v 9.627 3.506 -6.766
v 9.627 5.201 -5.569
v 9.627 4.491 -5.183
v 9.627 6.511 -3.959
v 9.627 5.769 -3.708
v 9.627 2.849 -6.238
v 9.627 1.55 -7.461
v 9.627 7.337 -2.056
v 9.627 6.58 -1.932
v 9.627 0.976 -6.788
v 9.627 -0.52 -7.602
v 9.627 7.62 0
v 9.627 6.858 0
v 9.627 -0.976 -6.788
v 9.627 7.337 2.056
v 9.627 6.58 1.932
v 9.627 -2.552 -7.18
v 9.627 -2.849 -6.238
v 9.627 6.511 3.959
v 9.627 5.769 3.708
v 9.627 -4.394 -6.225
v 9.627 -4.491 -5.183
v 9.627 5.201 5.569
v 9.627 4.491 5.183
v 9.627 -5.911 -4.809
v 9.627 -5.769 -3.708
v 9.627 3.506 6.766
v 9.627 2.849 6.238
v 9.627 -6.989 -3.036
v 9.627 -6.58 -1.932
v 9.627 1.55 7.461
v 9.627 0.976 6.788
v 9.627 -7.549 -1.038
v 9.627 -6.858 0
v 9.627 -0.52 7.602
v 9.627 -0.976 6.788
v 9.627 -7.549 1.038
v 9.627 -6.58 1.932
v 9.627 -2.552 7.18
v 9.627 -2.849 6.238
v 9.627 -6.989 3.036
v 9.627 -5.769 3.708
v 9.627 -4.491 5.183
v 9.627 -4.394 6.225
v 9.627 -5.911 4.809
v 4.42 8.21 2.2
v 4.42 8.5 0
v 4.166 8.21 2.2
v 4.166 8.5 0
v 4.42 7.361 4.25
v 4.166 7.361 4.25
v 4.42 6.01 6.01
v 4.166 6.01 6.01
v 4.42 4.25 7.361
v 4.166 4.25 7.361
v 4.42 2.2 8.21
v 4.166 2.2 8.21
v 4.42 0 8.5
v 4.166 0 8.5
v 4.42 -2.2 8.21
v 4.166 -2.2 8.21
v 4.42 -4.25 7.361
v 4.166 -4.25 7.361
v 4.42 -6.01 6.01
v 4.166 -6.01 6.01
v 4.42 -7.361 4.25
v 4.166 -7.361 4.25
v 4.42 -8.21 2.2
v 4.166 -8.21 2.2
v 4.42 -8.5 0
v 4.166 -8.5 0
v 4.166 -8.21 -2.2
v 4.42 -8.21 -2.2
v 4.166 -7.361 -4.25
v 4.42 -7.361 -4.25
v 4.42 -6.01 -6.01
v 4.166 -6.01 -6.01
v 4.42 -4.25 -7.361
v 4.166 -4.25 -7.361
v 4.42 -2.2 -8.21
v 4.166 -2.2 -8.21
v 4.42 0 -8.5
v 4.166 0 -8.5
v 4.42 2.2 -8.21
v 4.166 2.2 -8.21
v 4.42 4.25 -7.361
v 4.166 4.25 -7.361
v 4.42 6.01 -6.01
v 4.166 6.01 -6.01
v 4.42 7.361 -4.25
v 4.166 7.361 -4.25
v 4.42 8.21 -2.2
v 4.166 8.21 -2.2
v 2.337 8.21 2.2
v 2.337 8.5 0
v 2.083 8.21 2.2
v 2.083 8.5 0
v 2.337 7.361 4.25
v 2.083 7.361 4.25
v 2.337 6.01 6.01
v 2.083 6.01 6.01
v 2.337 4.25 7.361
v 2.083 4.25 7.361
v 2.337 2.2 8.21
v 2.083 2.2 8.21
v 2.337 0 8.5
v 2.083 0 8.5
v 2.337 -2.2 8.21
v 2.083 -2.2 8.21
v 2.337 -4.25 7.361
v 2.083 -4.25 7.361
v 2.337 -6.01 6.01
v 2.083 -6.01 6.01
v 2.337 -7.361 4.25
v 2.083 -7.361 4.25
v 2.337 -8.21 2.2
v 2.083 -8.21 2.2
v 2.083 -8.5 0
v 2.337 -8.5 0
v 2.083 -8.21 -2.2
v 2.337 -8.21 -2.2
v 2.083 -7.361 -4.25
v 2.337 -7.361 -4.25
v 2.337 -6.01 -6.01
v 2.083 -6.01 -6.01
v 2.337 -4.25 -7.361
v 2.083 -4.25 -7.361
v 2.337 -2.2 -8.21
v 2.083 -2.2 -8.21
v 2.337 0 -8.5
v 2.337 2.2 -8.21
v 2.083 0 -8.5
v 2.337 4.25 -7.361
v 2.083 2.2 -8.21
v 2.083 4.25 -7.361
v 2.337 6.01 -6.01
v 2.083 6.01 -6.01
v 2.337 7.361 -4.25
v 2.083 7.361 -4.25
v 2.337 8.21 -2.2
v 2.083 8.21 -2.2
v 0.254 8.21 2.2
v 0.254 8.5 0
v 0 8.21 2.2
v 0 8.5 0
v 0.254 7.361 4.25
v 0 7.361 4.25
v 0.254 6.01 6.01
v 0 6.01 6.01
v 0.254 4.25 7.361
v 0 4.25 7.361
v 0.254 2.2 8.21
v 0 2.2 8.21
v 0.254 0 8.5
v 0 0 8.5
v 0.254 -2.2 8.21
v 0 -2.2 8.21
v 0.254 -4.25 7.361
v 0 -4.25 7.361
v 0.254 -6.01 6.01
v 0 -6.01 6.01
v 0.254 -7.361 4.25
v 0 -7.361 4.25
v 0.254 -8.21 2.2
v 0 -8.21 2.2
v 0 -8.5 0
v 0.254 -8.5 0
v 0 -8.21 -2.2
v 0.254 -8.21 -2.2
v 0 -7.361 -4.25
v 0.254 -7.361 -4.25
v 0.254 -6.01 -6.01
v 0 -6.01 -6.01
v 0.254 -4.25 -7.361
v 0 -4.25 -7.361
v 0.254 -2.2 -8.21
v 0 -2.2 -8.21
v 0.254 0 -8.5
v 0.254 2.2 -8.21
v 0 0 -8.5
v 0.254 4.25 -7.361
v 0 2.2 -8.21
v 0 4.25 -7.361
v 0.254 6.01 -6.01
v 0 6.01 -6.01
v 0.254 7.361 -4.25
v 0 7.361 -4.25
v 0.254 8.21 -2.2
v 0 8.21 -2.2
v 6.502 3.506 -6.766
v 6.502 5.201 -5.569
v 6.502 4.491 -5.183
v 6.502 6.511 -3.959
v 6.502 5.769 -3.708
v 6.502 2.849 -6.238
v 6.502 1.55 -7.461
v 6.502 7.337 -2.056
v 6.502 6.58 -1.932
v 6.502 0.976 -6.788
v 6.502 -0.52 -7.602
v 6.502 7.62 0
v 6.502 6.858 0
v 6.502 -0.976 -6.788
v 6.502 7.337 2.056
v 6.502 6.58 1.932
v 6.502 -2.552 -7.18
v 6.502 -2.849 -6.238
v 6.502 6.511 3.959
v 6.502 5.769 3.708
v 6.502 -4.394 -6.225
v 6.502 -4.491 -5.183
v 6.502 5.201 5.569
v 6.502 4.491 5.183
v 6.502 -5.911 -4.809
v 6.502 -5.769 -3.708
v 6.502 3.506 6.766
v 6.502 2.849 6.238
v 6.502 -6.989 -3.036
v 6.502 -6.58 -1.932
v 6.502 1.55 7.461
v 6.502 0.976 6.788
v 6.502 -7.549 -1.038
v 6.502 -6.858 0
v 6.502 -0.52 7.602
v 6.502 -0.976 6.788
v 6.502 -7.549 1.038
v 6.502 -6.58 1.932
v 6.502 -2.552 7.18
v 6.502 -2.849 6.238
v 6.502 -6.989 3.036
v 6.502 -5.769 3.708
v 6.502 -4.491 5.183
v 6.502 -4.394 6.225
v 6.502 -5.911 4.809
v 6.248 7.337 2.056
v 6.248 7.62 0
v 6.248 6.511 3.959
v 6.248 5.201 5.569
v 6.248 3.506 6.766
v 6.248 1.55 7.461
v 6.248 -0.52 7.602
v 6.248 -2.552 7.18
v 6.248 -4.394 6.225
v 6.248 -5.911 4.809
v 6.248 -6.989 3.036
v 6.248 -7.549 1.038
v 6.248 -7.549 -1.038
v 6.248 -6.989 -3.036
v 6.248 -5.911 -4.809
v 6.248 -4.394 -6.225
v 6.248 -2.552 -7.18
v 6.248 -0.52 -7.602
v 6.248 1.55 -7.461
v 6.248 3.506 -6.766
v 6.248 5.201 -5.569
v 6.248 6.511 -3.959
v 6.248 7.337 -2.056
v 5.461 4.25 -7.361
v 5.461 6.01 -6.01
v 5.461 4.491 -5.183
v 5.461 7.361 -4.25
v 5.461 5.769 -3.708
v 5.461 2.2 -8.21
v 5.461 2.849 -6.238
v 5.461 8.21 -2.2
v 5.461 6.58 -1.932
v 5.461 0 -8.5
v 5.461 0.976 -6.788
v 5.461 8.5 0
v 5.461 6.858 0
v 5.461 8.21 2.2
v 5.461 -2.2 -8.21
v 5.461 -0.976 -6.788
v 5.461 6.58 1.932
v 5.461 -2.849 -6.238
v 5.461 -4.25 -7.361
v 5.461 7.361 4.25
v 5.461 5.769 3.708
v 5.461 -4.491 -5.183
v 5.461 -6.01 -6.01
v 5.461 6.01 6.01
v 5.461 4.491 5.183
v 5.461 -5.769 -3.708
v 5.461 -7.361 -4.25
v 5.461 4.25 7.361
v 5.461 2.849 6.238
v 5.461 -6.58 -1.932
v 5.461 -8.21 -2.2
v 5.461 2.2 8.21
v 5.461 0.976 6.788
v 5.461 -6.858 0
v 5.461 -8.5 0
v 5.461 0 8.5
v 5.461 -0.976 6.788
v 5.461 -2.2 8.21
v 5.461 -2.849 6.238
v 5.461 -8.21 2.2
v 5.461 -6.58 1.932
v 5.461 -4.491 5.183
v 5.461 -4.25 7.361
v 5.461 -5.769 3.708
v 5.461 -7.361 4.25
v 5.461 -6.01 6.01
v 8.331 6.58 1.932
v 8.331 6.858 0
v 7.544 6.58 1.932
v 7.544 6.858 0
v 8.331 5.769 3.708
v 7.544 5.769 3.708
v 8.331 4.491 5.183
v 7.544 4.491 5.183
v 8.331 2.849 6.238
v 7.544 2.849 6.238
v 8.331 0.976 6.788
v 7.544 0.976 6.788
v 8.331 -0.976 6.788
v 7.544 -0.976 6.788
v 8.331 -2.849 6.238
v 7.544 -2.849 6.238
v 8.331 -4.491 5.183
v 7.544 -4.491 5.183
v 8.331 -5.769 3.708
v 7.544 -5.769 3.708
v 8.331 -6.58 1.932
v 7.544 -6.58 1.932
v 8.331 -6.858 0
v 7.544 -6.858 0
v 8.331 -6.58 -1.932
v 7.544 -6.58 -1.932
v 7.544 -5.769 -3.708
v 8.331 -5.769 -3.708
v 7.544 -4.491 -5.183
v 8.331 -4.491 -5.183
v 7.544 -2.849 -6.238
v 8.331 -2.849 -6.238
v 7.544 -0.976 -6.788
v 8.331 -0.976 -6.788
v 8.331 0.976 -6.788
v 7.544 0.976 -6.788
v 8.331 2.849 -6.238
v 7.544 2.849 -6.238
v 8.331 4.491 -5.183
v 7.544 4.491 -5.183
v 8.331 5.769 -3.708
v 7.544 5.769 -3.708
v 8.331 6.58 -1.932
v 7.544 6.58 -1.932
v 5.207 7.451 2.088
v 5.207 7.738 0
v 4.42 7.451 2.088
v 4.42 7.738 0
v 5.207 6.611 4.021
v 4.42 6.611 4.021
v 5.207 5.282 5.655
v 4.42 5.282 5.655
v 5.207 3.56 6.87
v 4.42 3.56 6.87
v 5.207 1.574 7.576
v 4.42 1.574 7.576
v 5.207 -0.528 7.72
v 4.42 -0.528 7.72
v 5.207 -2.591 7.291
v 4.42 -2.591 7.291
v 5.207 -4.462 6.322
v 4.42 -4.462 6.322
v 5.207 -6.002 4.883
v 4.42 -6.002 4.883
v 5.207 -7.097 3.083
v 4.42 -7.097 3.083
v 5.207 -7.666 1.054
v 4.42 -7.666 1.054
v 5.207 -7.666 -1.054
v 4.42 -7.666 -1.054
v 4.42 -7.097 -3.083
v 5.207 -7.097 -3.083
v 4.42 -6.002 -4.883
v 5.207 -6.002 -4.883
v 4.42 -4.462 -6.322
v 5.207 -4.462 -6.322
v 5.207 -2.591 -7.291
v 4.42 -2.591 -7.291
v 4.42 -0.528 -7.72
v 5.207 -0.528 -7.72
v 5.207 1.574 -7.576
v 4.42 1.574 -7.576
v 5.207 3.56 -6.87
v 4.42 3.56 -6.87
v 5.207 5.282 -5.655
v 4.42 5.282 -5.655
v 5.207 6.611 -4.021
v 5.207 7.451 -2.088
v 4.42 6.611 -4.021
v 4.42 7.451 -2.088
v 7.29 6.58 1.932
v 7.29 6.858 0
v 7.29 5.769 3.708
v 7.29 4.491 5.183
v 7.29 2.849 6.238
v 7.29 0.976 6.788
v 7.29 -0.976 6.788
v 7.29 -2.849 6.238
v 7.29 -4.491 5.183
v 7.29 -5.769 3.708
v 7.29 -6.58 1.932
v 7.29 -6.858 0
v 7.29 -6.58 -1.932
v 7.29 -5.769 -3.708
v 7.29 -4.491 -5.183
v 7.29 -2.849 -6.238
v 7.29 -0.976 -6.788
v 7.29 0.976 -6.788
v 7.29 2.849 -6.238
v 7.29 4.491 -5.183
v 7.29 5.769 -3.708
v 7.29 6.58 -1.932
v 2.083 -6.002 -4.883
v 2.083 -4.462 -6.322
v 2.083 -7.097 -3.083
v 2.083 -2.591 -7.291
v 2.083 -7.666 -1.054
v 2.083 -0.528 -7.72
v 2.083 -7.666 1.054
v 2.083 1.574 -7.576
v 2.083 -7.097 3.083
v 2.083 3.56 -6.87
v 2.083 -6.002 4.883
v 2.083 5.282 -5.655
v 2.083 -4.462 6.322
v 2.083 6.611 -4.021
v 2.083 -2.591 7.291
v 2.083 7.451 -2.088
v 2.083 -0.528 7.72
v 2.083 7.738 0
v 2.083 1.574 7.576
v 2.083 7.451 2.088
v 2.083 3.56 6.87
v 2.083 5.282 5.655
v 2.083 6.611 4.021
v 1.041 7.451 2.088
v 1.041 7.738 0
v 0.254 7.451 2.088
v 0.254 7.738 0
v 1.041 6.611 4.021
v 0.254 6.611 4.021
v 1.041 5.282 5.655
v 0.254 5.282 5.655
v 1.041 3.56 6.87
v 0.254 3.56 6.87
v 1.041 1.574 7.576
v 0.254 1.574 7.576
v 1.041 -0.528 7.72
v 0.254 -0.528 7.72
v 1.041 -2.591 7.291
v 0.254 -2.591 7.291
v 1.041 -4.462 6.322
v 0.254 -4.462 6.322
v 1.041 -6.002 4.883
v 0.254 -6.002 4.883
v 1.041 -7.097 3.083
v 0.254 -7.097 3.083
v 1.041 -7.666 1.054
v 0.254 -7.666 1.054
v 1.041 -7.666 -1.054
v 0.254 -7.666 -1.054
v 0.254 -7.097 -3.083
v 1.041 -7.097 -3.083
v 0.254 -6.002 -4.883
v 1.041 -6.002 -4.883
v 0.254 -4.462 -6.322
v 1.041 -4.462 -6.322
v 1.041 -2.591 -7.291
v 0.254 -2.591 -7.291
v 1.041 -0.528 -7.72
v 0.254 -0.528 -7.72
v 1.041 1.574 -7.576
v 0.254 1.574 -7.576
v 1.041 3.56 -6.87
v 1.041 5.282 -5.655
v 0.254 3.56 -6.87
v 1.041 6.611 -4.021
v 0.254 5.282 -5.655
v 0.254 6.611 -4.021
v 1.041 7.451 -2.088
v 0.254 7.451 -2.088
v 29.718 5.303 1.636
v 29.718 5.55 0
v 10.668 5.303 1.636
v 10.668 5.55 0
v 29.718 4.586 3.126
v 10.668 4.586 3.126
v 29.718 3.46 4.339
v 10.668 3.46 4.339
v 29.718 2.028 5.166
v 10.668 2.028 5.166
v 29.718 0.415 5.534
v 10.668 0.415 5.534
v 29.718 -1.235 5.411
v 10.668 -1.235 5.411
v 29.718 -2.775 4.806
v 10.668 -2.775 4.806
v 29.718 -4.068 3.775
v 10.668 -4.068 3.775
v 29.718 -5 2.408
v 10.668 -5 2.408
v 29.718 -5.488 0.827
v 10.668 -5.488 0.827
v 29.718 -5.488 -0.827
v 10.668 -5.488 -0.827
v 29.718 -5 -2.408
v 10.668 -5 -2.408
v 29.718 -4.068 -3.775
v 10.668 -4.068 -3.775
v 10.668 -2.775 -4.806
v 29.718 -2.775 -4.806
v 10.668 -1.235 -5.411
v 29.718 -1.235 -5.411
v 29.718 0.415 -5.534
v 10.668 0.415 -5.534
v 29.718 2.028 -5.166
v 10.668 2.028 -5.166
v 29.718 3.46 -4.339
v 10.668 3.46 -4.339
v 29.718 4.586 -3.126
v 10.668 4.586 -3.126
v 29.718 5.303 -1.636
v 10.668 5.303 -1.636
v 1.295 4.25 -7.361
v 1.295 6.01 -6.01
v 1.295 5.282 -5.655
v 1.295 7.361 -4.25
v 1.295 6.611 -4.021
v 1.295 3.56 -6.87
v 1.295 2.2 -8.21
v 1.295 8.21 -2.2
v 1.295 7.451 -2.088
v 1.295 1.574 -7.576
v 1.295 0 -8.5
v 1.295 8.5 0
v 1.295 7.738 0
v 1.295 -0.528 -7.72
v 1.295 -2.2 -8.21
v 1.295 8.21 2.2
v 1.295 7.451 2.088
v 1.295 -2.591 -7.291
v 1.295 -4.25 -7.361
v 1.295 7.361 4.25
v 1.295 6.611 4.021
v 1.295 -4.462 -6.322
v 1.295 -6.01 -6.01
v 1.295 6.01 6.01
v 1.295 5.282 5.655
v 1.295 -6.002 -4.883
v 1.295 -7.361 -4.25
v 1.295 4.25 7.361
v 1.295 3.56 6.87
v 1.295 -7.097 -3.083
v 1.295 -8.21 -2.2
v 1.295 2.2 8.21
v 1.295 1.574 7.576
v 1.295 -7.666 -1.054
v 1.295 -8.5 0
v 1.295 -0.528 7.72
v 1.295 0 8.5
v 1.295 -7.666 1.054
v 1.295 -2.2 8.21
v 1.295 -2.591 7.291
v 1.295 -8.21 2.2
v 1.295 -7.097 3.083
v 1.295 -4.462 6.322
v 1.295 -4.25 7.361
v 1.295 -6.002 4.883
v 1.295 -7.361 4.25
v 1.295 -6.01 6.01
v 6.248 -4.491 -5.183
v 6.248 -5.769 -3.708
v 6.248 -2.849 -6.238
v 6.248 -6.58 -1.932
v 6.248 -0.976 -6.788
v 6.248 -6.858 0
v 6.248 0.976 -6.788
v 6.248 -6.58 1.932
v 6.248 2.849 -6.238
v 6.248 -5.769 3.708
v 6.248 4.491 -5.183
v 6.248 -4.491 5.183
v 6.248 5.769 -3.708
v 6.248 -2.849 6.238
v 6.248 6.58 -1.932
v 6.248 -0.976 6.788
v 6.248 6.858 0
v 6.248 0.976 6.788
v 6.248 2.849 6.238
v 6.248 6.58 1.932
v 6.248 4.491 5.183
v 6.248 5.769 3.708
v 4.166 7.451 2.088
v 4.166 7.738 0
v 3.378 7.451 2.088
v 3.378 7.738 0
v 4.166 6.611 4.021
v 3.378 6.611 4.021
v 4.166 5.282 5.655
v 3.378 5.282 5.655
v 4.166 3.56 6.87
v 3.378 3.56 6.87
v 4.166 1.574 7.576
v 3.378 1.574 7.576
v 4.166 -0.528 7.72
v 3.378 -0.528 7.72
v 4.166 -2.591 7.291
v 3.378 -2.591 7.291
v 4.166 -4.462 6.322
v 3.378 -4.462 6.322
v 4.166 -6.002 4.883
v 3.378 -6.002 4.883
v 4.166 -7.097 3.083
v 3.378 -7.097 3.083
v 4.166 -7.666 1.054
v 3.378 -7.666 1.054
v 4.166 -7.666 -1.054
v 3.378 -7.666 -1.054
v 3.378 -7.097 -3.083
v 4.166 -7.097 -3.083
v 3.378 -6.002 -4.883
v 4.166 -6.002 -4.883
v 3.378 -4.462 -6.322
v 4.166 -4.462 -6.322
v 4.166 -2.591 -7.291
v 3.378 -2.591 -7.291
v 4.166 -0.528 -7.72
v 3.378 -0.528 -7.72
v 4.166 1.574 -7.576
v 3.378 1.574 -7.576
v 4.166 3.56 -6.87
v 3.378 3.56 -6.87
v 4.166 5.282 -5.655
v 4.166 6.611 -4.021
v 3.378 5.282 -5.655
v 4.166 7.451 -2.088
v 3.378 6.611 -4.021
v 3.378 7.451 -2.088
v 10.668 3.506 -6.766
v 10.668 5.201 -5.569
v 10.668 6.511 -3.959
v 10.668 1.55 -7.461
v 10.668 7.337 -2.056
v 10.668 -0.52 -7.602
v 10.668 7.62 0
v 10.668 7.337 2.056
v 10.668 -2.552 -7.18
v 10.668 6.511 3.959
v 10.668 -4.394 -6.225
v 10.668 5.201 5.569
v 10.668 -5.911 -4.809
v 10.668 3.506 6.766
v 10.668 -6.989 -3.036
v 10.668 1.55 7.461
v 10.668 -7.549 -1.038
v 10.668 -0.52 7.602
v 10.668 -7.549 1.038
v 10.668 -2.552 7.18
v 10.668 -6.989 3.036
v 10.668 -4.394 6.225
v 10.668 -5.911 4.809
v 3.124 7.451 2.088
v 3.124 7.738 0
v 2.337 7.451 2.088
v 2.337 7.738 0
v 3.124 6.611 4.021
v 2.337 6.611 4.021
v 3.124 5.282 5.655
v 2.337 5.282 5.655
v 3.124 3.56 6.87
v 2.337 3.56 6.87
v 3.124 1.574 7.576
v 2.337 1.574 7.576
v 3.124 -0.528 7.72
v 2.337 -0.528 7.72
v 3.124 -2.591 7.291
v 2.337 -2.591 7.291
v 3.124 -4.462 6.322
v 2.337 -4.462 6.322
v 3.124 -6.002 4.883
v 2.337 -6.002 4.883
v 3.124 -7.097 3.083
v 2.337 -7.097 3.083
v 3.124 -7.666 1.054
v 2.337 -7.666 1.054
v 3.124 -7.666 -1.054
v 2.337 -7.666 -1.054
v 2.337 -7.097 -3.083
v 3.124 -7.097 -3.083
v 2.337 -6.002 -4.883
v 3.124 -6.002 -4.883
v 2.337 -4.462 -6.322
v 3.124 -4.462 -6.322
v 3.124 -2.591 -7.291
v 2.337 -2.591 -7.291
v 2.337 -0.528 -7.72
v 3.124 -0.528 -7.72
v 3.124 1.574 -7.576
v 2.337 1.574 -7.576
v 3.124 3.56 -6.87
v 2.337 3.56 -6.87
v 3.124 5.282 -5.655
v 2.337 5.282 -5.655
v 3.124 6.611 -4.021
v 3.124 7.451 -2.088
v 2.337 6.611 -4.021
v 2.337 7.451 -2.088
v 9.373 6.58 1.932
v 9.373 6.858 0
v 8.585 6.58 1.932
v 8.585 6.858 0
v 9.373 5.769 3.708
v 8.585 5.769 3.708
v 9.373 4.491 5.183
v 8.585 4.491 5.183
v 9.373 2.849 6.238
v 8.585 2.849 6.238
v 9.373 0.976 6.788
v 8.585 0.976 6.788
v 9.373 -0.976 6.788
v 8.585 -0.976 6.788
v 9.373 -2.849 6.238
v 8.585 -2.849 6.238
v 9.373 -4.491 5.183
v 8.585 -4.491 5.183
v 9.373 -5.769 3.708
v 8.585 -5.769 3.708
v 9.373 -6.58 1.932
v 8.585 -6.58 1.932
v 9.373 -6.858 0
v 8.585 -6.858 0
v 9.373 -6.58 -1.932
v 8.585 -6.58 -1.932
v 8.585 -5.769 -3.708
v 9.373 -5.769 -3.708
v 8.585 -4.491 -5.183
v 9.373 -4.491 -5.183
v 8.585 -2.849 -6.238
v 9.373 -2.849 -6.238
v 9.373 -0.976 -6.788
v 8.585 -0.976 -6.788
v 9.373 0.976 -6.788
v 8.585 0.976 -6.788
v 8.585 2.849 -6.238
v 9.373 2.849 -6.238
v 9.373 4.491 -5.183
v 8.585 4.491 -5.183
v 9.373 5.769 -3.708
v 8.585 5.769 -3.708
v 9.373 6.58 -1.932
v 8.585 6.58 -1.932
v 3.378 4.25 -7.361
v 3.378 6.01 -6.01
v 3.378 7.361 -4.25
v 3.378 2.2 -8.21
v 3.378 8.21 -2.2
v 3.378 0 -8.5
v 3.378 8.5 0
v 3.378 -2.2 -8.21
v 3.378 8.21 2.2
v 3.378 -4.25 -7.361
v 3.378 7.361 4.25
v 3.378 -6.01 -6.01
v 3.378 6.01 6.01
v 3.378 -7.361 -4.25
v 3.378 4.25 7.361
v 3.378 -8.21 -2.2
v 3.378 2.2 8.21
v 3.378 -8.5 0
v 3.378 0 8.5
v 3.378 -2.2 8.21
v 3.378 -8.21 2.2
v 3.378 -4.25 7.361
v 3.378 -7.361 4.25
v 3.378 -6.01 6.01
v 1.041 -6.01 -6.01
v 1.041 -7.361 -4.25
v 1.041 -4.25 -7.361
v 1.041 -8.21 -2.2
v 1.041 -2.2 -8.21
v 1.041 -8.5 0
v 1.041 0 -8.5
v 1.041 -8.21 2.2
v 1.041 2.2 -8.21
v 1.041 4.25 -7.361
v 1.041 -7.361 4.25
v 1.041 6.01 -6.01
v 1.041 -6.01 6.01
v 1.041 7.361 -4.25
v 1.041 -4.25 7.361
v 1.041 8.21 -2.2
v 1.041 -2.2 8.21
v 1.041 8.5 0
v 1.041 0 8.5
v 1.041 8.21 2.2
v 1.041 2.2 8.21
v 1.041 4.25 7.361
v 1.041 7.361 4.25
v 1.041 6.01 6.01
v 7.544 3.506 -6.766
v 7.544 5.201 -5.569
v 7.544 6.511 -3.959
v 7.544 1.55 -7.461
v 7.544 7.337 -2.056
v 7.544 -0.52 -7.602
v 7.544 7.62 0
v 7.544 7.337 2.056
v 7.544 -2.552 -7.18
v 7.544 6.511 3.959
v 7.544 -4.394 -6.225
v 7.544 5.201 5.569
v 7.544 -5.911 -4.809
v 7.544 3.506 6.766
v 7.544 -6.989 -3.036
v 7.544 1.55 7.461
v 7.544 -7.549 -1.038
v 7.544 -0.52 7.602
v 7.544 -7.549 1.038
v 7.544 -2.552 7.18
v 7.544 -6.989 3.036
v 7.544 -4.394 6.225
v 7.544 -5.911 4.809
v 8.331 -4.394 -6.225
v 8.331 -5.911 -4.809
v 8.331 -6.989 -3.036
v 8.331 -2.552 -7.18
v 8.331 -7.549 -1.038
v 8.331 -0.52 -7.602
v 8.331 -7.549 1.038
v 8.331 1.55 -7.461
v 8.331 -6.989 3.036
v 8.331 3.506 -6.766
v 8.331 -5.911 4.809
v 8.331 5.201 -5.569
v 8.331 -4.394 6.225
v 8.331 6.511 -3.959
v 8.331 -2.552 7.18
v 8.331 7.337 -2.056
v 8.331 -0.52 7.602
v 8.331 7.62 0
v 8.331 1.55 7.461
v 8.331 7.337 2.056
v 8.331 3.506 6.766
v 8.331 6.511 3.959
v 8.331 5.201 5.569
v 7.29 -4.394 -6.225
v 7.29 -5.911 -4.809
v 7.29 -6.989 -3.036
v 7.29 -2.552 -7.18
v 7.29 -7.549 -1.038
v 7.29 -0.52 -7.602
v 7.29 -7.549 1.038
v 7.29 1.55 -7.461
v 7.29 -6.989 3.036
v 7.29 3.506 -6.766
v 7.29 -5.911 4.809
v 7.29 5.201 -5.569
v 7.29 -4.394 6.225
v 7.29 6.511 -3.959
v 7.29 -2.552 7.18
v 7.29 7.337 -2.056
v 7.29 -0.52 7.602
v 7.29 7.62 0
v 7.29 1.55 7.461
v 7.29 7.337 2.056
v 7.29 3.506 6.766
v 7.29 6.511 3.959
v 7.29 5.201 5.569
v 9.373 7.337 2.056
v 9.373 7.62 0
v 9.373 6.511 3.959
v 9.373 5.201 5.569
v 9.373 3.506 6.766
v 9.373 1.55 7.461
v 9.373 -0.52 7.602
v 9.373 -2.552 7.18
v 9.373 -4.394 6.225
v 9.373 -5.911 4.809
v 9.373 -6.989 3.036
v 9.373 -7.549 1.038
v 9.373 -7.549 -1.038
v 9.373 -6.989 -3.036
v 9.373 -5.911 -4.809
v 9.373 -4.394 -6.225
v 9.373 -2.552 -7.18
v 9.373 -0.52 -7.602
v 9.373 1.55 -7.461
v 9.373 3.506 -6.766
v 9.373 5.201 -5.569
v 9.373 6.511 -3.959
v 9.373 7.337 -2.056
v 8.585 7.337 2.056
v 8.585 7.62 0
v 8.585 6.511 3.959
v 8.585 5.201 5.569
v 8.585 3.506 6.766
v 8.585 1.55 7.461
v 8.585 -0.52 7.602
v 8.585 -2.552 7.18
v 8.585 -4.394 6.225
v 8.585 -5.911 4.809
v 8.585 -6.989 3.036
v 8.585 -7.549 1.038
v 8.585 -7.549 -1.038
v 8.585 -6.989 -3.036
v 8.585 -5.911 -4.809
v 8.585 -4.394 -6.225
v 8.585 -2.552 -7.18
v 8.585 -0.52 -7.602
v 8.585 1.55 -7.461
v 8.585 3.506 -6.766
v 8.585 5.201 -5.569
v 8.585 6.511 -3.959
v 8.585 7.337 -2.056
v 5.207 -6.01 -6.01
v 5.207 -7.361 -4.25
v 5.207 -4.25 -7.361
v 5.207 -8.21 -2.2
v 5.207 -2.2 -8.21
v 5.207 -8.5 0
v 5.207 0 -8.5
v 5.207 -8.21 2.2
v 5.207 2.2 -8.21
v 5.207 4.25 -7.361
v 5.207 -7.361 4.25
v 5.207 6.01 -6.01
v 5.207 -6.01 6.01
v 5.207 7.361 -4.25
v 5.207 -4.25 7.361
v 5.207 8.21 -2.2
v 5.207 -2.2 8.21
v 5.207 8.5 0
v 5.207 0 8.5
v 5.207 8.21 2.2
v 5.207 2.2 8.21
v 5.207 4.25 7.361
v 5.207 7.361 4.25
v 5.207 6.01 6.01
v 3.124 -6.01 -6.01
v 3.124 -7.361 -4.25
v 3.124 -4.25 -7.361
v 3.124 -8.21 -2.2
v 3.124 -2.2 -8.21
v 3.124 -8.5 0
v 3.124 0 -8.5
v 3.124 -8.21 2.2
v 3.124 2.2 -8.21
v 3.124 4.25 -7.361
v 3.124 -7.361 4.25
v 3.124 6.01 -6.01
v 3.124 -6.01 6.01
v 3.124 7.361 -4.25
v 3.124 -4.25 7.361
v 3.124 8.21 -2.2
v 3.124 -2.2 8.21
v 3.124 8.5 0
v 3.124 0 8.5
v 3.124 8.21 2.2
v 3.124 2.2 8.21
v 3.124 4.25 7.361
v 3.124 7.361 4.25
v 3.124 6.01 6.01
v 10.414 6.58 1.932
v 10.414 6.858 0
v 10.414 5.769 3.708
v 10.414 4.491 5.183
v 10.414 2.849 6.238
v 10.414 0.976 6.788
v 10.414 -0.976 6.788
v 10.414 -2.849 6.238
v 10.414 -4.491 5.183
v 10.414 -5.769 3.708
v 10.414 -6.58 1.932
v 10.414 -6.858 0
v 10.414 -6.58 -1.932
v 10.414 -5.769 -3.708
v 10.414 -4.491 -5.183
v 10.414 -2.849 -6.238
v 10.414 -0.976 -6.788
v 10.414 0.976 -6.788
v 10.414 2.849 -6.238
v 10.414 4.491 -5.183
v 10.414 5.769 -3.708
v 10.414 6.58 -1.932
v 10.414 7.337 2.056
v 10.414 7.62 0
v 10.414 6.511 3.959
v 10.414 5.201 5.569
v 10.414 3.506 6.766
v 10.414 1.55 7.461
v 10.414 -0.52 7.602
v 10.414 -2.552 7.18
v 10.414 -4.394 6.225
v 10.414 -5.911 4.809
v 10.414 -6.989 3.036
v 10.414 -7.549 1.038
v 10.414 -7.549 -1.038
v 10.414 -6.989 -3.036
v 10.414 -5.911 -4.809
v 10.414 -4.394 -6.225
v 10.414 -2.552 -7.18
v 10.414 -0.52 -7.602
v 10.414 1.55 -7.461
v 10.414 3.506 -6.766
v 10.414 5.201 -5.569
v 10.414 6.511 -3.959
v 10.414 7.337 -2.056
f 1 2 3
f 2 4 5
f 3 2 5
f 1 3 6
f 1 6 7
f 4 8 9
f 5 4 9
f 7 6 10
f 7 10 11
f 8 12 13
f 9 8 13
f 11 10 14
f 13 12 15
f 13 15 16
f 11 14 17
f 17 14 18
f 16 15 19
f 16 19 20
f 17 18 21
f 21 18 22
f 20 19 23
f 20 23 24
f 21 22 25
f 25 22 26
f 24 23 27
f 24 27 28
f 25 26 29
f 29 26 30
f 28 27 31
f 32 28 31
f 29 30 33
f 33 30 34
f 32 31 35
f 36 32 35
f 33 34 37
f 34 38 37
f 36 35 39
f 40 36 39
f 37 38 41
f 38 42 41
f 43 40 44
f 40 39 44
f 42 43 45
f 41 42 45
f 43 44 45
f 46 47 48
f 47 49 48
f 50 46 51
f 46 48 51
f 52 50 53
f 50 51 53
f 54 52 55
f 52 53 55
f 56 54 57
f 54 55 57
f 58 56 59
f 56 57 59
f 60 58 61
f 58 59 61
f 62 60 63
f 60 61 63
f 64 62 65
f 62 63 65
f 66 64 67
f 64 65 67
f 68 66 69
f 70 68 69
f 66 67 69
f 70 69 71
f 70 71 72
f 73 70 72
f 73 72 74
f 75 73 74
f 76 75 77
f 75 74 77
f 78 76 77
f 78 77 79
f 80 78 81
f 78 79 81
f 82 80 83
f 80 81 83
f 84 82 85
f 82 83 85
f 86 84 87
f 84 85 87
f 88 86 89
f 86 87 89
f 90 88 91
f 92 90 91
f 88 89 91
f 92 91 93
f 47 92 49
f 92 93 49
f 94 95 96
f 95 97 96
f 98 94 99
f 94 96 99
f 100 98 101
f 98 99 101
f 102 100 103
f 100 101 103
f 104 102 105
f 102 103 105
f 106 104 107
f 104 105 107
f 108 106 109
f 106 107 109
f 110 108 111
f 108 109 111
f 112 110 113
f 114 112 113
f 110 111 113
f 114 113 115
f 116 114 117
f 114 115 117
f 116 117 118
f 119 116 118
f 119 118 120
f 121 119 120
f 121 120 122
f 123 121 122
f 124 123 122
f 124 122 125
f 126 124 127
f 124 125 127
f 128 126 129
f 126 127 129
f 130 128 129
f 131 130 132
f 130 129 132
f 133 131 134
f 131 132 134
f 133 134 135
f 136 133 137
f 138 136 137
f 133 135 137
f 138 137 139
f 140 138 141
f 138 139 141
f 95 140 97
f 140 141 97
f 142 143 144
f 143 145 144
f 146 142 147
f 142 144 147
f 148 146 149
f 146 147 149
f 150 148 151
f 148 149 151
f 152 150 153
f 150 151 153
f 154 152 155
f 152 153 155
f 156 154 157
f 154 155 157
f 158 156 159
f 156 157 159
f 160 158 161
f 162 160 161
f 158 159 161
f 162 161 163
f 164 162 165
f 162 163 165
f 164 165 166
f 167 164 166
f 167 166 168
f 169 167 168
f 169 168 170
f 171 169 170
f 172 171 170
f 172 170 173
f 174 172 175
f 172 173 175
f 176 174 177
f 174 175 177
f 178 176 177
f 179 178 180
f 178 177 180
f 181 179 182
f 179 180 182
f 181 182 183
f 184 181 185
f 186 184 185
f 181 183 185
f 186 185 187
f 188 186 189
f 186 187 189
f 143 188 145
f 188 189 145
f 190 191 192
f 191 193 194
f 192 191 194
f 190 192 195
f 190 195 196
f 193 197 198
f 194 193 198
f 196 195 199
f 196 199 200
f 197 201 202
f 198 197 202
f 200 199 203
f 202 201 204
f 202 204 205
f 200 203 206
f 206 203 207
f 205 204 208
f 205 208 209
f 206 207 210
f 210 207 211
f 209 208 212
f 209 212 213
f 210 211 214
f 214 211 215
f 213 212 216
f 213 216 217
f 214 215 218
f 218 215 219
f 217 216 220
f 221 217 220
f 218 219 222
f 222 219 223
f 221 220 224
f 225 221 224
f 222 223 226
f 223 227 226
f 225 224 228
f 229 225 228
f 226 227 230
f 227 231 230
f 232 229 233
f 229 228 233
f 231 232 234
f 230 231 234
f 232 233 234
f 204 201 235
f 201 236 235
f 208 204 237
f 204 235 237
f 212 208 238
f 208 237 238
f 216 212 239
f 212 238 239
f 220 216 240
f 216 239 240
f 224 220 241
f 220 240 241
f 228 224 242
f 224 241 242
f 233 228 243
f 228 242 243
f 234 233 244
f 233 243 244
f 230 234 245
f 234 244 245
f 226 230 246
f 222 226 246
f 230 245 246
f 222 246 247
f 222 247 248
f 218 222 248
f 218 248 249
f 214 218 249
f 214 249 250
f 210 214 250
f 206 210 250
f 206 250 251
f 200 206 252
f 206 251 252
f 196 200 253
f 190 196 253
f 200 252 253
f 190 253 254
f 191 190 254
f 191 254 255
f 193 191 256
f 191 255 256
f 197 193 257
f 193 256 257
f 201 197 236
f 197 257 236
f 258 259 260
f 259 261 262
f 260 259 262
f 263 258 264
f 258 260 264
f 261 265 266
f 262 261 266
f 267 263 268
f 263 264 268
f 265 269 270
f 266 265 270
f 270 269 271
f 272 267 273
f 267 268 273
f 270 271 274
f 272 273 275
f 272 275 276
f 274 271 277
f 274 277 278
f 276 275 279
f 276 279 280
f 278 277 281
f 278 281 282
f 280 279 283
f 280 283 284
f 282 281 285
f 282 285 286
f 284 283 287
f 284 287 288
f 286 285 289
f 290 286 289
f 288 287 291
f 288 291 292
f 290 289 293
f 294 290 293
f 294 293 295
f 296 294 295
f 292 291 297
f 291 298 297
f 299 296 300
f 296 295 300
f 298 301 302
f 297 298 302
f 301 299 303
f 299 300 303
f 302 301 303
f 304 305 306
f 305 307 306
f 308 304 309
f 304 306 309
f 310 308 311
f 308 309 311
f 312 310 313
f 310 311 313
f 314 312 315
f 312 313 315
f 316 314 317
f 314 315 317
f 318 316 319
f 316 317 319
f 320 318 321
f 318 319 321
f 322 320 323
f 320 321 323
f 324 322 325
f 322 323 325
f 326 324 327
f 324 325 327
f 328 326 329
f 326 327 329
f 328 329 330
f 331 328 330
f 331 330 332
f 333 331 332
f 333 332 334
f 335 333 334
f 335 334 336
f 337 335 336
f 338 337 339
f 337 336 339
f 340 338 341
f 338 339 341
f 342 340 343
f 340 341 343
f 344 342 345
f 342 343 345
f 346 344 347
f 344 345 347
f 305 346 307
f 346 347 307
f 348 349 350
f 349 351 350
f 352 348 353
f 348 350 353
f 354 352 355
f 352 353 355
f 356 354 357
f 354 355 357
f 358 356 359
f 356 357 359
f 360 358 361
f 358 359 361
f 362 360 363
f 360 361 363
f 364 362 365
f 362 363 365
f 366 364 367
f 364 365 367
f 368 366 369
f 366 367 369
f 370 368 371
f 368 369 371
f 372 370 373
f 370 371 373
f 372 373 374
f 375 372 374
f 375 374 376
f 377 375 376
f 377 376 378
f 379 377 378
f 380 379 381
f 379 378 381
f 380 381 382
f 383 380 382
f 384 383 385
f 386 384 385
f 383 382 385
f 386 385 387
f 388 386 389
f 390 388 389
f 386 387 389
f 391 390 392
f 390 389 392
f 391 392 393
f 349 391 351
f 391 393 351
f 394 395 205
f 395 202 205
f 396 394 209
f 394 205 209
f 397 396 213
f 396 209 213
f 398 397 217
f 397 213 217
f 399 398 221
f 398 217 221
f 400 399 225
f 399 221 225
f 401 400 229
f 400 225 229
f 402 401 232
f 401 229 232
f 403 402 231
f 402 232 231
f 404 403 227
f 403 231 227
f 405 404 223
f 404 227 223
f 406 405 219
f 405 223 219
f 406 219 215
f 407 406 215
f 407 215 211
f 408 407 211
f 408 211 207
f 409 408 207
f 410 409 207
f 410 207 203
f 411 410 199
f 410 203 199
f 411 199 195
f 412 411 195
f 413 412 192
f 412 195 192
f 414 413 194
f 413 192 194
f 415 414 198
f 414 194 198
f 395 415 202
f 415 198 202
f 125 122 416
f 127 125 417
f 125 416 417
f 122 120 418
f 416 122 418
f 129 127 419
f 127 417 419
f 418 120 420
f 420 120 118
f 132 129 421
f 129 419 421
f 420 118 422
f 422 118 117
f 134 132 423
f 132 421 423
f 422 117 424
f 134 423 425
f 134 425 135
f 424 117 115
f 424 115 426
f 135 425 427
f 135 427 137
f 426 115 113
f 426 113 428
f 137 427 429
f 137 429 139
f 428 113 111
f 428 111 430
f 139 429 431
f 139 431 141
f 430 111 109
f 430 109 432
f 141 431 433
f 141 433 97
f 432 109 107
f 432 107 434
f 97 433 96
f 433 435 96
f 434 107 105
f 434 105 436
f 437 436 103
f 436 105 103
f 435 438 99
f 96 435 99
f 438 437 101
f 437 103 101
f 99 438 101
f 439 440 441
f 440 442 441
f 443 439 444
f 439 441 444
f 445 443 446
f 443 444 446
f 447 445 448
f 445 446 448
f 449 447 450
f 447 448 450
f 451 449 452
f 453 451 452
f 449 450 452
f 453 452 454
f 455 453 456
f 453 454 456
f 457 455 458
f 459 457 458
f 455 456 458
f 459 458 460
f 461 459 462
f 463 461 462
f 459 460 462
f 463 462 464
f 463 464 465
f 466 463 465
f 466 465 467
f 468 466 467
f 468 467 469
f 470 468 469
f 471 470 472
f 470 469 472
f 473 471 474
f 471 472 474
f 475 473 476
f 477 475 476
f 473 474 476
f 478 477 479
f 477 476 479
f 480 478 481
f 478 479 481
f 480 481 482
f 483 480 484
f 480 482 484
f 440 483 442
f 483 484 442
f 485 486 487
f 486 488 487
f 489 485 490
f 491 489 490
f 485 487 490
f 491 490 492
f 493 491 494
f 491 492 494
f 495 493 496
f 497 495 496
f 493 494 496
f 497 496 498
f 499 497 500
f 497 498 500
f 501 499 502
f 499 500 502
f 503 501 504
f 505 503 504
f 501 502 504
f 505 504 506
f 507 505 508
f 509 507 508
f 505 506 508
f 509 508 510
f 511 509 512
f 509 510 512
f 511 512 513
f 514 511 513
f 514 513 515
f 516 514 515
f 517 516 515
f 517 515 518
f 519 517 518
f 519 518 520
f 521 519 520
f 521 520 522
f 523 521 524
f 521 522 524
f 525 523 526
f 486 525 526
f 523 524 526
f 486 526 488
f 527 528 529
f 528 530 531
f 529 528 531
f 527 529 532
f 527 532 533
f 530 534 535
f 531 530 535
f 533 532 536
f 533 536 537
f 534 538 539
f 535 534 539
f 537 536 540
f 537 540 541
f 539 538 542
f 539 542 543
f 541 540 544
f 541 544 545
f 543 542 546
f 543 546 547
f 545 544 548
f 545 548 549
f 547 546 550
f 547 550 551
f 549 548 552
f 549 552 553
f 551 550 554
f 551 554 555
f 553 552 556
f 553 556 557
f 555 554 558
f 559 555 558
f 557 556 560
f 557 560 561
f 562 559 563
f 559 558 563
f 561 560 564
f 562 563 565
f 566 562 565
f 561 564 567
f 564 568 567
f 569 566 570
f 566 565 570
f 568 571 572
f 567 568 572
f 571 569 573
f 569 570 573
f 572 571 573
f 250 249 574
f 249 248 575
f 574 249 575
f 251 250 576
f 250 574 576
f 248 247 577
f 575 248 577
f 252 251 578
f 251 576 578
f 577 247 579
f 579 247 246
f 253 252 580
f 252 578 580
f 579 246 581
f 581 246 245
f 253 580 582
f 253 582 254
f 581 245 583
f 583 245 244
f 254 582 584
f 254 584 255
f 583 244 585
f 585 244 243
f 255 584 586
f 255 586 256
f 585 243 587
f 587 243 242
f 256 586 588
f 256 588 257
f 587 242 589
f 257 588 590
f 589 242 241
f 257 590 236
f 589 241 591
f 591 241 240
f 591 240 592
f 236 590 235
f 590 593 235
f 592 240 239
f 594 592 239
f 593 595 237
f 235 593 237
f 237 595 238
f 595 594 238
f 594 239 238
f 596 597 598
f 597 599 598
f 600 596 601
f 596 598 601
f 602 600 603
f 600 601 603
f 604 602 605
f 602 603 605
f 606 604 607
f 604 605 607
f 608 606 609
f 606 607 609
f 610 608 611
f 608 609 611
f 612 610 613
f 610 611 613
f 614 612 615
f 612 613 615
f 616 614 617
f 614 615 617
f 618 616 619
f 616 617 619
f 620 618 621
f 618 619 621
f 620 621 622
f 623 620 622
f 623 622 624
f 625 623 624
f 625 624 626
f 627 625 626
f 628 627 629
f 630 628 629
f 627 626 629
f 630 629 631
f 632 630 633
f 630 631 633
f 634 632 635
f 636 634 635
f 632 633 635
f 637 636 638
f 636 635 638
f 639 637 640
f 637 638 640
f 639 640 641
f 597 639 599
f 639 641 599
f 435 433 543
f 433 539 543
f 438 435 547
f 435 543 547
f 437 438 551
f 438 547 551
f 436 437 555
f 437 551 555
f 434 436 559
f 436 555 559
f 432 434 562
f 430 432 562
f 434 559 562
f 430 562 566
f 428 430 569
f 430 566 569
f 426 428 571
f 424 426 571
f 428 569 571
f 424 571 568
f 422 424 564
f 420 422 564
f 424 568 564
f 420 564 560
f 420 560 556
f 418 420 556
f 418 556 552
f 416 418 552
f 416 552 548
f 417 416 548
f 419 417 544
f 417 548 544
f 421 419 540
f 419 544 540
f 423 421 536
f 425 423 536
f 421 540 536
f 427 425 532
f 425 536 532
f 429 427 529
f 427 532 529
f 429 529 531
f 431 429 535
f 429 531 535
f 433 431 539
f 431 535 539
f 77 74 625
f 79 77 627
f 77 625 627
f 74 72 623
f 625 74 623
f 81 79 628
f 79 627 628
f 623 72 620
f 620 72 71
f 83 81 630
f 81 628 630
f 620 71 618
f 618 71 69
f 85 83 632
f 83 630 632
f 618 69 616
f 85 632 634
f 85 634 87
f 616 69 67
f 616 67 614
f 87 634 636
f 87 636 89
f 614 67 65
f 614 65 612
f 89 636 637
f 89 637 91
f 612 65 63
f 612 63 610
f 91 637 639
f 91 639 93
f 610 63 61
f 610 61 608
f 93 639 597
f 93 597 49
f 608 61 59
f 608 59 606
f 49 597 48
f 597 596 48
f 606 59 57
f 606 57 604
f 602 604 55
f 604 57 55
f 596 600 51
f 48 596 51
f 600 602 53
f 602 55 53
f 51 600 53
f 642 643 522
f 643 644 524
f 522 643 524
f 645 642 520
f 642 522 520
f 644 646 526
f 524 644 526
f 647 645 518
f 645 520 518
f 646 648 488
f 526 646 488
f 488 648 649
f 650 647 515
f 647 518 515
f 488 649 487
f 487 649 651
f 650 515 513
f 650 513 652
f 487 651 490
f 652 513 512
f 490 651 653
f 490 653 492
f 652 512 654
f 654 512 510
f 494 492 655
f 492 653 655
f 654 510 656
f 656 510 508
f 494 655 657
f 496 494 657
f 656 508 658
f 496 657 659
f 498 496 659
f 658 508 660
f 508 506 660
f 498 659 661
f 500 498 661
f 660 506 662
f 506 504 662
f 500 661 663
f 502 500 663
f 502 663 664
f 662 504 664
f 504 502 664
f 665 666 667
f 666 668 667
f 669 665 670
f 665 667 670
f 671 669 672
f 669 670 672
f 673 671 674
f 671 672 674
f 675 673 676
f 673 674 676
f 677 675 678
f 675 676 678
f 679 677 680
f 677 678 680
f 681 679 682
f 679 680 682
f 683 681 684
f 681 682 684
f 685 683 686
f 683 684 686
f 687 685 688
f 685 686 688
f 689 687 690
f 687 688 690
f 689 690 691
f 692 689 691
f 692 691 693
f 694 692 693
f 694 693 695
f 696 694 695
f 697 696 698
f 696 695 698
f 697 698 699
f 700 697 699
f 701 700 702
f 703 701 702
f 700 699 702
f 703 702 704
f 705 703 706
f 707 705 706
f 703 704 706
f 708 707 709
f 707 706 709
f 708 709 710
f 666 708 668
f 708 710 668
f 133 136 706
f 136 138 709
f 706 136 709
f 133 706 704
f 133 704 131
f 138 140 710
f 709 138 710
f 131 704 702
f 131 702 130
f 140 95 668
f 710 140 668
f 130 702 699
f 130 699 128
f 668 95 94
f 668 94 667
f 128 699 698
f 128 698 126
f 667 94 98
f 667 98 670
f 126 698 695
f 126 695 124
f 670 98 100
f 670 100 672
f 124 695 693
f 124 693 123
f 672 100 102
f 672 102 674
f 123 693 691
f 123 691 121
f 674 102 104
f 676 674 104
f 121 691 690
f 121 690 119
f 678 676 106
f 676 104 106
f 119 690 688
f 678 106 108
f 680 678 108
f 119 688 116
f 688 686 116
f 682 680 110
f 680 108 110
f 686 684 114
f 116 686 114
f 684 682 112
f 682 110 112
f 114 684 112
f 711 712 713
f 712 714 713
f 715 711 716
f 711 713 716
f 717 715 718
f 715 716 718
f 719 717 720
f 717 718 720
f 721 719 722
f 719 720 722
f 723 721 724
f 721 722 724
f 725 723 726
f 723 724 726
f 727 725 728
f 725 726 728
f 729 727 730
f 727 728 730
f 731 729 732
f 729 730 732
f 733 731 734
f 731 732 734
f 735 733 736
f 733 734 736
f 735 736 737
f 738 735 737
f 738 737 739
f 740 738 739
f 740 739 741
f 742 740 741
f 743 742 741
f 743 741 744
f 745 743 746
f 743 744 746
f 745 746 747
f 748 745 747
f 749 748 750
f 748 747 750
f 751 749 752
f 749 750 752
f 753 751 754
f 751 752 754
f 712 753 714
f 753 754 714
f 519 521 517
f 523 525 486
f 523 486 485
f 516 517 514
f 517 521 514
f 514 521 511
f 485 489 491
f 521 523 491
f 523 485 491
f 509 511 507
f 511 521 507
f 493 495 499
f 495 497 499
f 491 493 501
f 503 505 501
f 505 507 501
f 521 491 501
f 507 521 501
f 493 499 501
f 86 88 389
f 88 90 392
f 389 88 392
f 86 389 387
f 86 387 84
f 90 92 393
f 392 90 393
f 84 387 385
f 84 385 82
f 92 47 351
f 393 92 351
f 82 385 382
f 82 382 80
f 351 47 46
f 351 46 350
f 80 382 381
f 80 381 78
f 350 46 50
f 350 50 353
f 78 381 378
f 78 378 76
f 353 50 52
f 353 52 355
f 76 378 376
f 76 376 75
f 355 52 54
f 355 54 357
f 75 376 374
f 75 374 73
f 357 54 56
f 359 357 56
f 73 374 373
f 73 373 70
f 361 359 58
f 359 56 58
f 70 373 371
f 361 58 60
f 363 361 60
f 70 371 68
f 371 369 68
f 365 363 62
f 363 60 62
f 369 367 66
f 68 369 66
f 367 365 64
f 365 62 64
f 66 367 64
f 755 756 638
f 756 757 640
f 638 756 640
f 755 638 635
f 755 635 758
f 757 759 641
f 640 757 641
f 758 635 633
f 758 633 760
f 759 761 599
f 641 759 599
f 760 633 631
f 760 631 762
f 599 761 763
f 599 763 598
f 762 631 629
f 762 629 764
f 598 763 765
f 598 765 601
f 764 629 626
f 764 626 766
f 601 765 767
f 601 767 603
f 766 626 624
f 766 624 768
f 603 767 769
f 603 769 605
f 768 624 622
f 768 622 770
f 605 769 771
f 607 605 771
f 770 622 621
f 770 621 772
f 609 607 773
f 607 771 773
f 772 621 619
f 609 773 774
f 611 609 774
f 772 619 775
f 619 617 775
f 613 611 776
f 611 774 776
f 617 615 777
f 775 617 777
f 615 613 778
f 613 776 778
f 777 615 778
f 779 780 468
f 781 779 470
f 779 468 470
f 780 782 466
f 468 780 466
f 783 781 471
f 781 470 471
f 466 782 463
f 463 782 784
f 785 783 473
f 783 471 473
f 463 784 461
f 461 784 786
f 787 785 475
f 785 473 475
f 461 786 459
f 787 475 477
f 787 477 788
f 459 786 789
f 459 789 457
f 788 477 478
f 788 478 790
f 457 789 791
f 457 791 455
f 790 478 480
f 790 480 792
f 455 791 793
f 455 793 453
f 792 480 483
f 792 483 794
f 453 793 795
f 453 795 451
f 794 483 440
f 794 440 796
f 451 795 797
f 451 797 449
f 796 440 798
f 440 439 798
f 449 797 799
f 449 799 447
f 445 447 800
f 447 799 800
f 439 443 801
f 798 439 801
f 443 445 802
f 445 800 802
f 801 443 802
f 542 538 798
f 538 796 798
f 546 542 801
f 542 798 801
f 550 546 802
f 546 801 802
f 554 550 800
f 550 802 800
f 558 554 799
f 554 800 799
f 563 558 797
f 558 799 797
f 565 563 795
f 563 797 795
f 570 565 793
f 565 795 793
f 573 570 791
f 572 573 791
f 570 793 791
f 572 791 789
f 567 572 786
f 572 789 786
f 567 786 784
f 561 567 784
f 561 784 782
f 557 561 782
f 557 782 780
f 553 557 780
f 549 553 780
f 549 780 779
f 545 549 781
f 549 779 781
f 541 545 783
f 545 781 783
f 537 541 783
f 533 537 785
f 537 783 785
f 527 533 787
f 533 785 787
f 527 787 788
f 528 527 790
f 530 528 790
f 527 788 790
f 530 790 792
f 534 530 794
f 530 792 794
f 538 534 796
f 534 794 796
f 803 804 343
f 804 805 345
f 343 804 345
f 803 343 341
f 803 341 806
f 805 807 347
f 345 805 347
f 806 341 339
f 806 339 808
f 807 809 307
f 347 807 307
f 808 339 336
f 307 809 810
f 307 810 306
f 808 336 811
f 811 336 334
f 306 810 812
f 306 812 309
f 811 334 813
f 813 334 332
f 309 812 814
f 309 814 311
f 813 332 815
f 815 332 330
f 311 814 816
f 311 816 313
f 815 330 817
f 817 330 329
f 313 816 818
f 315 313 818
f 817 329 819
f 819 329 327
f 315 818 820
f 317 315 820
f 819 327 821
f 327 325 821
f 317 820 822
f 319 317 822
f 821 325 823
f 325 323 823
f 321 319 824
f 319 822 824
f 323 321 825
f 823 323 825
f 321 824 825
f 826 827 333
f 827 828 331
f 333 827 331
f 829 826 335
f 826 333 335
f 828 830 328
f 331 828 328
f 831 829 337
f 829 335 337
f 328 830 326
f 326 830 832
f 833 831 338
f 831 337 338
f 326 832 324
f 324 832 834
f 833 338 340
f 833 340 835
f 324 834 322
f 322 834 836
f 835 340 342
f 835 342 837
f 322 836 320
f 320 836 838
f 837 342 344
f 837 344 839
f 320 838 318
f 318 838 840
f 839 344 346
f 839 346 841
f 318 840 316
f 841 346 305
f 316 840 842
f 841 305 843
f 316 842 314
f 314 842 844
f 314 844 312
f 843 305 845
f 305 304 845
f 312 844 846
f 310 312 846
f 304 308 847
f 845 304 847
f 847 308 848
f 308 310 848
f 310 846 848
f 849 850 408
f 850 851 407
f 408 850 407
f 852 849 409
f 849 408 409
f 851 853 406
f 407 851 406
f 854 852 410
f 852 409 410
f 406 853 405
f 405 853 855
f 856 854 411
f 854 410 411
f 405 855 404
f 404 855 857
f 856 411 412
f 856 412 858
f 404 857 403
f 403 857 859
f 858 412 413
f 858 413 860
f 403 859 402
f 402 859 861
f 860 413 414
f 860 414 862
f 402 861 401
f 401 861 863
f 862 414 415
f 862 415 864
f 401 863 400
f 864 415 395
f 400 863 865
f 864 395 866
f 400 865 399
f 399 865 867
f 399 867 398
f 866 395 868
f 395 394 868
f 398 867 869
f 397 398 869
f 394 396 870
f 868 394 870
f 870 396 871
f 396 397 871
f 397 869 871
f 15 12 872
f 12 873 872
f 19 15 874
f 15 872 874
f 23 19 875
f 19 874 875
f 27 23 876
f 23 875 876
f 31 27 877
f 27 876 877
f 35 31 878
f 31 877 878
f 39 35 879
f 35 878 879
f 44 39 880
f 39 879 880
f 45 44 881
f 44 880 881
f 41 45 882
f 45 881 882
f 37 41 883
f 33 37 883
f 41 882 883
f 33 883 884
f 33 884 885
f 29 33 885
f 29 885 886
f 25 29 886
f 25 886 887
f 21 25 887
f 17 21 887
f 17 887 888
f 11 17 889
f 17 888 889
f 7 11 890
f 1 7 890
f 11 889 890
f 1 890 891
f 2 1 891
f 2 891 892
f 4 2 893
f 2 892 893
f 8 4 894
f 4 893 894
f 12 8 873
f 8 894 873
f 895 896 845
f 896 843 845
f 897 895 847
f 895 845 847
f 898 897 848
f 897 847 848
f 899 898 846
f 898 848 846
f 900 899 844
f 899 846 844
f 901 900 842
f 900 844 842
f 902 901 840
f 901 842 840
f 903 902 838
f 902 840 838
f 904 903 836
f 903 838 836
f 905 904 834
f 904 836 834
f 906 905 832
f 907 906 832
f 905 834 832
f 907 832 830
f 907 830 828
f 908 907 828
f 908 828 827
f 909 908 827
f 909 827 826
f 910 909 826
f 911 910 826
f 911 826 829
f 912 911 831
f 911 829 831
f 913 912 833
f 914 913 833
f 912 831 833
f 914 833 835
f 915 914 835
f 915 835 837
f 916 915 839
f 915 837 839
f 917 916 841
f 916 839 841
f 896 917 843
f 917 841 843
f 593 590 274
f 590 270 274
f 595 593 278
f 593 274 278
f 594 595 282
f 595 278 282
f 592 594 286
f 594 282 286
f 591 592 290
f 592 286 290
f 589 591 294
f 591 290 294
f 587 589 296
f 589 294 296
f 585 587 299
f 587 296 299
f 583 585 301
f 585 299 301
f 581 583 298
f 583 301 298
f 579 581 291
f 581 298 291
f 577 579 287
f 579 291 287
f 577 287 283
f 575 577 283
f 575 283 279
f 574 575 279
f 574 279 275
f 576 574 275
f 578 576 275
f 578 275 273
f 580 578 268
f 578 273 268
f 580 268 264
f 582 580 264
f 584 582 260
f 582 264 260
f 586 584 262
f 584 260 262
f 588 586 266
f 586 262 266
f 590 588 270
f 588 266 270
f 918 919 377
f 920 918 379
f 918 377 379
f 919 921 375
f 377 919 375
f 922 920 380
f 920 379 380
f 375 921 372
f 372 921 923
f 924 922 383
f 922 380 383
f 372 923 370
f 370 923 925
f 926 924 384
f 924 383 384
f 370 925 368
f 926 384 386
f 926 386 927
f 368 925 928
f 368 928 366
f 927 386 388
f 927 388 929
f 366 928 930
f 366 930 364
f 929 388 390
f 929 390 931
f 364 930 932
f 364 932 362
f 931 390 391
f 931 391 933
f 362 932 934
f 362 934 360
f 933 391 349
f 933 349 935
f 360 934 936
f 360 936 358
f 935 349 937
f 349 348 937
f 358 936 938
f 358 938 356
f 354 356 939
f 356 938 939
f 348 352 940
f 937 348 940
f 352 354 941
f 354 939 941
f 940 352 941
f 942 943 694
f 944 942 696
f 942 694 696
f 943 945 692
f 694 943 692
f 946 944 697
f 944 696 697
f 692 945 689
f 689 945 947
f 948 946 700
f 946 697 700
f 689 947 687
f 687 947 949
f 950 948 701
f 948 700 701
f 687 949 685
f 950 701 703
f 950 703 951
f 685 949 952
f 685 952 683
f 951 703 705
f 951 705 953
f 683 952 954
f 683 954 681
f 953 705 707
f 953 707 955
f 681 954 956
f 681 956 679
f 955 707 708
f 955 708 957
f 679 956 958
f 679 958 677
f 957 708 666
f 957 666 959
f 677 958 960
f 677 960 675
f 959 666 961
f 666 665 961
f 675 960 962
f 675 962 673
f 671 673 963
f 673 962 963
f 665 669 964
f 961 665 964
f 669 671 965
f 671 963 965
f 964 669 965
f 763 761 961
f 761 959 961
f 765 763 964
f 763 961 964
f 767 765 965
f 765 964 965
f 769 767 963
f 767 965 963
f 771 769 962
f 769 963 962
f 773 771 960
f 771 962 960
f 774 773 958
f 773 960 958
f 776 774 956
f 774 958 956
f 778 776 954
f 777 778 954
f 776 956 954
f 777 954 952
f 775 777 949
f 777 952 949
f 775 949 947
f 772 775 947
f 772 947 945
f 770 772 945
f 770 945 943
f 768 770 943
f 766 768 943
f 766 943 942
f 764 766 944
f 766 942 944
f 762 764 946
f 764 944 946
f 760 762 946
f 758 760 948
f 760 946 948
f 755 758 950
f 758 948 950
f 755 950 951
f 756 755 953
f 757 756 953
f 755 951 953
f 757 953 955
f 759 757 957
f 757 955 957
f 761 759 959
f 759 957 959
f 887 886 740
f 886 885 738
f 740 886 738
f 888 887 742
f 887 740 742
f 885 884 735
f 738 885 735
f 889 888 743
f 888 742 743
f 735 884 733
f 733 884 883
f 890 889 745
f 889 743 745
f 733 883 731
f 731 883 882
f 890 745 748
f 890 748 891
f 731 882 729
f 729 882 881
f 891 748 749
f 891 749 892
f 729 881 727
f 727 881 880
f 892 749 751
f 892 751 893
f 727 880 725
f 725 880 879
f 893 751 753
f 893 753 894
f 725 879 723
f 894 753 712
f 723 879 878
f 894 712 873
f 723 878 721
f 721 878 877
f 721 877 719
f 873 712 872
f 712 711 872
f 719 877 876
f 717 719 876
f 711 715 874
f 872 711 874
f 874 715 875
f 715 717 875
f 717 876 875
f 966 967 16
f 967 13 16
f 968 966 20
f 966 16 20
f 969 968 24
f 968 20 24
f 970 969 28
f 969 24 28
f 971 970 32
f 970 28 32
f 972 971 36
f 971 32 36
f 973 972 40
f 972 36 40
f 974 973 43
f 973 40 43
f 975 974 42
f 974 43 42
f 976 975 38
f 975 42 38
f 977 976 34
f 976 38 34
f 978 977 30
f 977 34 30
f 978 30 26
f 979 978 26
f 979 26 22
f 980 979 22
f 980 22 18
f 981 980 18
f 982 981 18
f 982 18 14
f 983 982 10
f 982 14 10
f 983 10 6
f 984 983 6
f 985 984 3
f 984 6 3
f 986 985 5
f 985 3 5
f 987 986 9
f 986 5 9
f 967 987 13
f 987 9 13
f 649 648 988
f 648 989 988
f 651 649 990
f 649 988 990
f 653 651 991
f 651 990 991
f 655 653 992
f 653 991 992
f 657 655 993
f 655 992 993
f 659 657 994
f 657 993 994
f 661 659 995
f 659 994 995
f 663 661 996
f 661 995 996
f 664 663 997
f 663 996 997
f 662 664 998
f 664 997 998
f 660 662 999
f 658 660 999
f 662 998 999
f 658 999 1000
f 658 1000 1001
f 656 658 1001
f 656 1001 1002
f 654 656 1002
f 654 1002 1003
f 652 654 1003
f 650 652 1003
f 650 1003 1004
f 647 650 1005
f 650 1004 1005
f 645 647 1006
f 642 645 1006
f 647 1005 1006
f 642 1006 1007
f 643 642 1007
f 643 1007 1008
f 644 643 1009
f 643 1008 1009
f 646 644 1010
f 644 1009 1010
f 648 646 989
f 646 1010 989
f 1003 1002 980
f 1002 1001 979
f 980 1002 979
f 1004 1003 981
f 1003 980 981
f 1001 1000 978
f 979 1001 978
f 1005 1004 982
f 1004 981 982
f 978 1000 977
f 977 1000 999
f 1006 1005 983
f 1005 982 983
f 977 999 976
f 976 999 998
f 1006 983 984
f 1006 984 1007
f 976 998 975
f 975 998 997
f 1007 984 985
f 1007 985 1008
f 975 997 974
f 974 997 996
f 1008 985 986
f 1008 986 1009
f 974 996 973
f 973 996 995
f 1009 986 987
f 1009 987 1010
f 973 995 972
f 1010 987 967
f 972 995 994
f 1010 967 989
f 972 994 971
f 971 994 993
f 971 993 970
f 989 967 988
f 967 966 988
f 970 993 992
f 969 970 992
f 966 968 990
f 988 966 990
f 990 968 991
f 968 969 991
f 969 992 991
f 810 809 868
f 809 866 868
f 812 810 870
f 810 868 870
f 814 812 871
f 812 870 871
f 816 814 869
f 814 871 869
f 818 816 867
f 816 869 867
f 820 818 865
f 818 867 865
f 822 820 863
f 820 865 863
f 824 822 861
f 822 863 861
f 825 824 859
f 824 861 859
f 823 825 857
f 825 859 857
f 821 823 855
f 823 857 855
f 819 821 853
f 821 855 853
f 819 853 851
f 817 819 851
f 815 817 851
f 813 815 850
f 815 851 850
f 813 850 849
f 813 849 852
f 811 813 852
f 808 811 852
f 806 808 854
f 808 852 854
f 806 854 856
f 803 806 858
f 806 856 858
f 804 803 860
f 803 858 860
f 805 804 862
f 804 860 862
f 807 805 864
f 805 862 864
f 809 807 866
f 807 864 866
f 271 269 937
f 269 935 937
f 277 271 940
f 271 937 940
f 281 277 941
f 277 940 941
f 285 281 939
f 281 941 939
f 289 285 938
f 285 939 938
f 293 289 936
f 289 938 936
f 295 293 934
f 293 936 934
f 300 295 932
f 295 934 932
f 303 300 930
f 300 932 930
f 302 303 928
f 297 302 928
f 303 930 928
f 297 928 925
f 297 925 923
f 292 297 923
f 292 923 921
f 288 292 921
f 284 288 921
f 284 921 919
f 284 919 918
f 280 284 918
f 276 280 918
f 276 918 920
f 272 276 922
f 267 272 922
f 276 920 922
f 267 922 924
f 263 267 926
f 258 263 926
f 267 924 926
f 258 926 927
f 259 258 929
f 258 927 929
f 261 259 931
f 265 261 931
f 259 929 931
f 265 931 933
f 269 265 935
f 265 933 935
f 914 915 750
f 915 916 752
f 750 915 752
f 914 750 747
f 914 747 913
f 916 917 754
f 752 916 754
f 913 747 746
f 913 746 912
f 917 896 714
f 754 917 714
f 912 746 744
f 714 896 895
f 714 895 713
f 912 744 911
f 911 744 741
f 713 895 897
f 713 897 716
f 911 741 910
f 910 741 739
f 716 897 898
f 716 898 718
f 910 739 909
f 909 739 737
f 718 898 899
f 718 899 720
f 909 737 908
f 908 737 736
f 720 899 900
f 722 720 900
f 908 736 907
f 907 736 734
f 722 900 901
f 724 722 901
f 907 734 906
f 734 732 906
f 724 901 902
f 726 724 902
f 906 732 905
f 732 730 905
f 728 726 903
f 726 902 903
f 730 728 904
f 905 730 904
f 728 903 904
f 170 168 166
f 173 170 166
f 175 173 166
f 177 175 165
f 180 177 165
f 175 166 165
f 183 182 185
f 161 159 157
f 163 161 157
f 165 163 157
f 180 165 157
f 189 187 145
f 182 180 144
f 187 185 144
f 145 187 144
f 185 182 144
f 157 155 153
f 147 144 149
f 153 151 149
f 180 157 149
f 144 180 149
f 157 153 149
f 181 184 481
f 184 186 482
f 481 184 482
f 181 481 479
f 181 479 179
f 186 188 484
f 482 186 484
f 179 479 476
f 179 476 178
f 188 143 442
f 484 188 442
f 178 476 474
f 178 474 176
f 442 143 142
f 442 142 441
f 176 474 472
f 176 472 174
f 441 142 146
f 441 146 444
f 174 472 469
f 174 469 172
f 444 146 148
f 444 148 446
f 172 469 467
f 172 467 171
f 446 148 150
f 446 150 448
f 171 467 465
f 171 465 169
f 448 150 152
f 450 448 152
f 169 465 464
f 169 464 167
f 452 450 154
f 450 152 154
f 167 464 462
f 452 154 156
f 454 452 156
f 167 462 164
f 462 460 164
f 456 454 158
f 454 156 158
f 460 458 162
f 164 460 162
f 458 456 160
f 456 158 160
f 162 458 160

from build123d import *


with BuildPart() as part:
    # Sketch1 → Revolve1 (revolve)
    with BuildSketch(Plane.XY):
        Polygon((0, 0), (29.718, 0), (29.718, 5.5499), (17.018, 5.5499), (10.668, 5.5499), (10.668, 7.62), (10.414, 7.62), (10.414, 6.858), (9.6266, 6.858), (9.6266, 7.62), (9.3726, 7.62), (9.3726, 6.858), (8.5852, 6.858), (8.5852, 7.62), (8.3312, 7.62), (8.3312, 6.858), (7.5438, 6.858), (7.5438, 7.62), (7.2898, 7.62), (7.2898, 6.858), (6.5024, 6.858), (6.5024, 7.62), (6.2484, 7.62), (6.2484, 6.858), (5.461, 6.858), (5.461, 7.62), (5.461, 8.500000018), (5.207, 8.500000018), (5.207, 7.738000018), (4.4196, 7.738000018), (4.4196, 8.500000018), (4.1656, 8.500000018), (4.1656, 7.738000018), (3.3782, 7.738000018), (3.3782, 8.500000018), (3.1242, 8.500000018), (3.1242, 7.738000018), (2.3368, 7.738000018), (2.3368, 8.500000018), (2.0828, 8.500000018), (2.0828, 7.738000018), (1.2954, 7.738000018), (1.2954, 8.500000018), (1.0414, 8.500000018), (1.0414, 7.738000018), (0.254, 7.738000018), (0.254, 8.500000018), (0, 8.500000018), align=None)
    revolve(axis=Axis((0, 0, 0), (1, 0, 0)))


solid = part.part
